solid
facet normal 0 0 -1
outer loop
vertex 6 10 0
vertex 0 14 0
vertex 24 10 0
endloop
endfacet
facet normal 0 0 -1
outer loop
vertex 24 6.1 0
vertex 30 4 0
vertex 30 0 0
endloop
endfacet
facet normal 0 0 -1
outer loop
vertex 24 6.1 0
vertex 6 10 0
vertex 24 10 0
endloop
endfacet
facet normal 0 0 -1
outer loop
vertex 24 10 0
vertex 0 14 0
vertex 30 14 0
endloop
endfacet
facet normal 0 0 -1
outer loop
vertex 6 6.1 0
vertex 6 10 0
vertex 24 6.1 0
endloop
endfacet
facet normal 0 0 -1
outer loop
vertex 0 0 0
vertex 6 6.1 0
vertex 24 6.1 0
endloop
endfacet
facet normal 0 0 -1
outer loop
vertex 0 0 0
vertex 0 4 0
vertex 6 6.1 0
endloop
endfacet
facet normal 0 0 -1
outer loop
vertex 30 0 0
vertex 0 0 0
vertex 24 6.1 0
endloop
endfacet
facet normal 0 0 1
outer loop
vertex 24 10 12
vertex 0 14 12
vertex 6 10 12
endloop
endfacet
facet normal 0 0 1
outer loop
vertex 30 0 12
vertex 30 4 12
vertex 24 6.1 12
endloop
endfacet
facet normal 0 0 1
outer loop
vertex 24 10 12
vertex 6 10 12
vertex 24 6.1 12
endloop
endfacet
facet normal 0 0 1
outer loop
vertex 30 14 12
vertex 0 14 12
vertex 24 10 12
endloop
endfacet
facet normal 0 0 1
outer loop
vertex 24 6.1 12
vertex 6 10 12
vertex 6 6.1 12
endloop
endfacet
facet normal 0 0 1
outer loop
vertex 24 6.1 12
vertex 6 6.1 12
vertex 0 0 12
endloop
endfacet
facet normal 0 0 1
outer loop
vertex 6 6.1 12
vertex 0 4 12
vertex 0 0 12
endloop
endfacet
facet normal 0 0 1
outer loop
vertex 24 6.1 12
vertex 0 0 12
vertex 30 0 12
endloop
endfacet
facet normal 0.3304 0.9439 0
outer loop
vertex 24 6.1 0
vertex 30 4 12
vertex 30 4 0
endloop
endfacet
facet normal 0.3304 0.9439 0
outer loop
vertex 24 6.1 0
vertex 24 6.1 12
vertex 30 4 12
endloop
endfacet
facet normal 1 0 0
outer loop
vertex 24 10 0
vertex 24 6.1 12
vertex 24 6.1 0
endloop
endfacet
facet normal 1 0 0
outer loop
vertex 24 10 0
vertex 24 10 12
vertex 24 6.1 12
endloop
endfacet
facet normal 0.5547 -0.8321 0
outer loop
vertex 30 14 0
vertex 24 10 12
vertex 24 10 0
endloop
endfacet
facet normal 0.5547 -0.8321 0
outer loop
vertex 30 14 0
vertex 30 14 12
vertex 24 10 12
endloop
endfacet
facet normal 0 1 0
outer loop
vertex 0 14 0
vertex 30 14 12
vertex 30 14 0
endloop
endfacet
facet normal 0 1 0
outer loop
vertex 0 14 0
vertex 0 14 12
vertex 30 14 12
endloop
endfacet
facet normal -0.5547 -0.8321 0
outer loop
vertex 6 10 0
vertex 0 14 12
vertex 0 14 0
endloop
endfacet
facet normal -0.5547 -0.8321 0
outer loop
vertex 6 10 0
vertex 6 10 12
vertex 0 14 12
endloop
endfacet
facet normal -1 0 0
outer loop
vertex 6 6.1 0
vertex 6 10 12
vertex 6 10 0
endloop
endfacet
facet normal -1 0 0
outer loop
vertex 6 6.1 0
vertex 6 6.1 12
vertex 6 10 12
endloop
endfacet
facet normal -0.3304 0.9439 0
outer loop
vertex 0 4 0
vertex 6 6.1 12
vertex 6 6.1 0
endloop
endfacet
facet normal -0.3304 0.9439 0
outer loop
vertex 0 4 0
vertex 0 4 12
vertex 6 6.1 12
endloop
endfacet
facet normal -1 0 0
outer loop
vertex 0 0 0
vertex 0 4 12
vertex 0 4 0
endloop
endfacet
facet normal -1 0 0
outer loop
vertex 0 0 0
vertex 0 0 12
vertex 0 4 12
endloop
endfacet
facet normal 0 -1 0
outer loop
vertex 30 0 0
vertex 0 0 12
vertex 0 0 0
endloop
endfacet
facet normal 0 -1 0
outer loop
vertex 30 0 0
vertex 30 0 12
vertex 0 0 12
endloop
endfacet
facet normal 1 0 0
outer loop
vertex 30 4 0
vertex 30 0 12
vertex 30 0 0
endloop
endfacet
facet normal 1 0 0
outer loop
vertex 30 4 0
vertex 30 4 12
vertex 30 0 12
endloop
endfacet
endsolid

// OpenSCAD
$fn = 32;

// ----------------------------------------------------------------------
// Key bar: dovetail key, 12 mm thick
// ----------------------------------------------------------------------

// --- parameters (mm) ---
profile_height = 12;      // extrusion height
profile_points = 10;      // points of the closed outline

profile = [[0, 0], [30, 0], [30, 4], [24, 6.1], [24, 10], [30, 14], [0, 14], [6, 10], [6, 6.1], [0, 4]];  // single closed polygon, 10 points, counter clockwise

// --- the one profile operation ---
linear_extrude(height = profile_height) polygon(points = profile);
